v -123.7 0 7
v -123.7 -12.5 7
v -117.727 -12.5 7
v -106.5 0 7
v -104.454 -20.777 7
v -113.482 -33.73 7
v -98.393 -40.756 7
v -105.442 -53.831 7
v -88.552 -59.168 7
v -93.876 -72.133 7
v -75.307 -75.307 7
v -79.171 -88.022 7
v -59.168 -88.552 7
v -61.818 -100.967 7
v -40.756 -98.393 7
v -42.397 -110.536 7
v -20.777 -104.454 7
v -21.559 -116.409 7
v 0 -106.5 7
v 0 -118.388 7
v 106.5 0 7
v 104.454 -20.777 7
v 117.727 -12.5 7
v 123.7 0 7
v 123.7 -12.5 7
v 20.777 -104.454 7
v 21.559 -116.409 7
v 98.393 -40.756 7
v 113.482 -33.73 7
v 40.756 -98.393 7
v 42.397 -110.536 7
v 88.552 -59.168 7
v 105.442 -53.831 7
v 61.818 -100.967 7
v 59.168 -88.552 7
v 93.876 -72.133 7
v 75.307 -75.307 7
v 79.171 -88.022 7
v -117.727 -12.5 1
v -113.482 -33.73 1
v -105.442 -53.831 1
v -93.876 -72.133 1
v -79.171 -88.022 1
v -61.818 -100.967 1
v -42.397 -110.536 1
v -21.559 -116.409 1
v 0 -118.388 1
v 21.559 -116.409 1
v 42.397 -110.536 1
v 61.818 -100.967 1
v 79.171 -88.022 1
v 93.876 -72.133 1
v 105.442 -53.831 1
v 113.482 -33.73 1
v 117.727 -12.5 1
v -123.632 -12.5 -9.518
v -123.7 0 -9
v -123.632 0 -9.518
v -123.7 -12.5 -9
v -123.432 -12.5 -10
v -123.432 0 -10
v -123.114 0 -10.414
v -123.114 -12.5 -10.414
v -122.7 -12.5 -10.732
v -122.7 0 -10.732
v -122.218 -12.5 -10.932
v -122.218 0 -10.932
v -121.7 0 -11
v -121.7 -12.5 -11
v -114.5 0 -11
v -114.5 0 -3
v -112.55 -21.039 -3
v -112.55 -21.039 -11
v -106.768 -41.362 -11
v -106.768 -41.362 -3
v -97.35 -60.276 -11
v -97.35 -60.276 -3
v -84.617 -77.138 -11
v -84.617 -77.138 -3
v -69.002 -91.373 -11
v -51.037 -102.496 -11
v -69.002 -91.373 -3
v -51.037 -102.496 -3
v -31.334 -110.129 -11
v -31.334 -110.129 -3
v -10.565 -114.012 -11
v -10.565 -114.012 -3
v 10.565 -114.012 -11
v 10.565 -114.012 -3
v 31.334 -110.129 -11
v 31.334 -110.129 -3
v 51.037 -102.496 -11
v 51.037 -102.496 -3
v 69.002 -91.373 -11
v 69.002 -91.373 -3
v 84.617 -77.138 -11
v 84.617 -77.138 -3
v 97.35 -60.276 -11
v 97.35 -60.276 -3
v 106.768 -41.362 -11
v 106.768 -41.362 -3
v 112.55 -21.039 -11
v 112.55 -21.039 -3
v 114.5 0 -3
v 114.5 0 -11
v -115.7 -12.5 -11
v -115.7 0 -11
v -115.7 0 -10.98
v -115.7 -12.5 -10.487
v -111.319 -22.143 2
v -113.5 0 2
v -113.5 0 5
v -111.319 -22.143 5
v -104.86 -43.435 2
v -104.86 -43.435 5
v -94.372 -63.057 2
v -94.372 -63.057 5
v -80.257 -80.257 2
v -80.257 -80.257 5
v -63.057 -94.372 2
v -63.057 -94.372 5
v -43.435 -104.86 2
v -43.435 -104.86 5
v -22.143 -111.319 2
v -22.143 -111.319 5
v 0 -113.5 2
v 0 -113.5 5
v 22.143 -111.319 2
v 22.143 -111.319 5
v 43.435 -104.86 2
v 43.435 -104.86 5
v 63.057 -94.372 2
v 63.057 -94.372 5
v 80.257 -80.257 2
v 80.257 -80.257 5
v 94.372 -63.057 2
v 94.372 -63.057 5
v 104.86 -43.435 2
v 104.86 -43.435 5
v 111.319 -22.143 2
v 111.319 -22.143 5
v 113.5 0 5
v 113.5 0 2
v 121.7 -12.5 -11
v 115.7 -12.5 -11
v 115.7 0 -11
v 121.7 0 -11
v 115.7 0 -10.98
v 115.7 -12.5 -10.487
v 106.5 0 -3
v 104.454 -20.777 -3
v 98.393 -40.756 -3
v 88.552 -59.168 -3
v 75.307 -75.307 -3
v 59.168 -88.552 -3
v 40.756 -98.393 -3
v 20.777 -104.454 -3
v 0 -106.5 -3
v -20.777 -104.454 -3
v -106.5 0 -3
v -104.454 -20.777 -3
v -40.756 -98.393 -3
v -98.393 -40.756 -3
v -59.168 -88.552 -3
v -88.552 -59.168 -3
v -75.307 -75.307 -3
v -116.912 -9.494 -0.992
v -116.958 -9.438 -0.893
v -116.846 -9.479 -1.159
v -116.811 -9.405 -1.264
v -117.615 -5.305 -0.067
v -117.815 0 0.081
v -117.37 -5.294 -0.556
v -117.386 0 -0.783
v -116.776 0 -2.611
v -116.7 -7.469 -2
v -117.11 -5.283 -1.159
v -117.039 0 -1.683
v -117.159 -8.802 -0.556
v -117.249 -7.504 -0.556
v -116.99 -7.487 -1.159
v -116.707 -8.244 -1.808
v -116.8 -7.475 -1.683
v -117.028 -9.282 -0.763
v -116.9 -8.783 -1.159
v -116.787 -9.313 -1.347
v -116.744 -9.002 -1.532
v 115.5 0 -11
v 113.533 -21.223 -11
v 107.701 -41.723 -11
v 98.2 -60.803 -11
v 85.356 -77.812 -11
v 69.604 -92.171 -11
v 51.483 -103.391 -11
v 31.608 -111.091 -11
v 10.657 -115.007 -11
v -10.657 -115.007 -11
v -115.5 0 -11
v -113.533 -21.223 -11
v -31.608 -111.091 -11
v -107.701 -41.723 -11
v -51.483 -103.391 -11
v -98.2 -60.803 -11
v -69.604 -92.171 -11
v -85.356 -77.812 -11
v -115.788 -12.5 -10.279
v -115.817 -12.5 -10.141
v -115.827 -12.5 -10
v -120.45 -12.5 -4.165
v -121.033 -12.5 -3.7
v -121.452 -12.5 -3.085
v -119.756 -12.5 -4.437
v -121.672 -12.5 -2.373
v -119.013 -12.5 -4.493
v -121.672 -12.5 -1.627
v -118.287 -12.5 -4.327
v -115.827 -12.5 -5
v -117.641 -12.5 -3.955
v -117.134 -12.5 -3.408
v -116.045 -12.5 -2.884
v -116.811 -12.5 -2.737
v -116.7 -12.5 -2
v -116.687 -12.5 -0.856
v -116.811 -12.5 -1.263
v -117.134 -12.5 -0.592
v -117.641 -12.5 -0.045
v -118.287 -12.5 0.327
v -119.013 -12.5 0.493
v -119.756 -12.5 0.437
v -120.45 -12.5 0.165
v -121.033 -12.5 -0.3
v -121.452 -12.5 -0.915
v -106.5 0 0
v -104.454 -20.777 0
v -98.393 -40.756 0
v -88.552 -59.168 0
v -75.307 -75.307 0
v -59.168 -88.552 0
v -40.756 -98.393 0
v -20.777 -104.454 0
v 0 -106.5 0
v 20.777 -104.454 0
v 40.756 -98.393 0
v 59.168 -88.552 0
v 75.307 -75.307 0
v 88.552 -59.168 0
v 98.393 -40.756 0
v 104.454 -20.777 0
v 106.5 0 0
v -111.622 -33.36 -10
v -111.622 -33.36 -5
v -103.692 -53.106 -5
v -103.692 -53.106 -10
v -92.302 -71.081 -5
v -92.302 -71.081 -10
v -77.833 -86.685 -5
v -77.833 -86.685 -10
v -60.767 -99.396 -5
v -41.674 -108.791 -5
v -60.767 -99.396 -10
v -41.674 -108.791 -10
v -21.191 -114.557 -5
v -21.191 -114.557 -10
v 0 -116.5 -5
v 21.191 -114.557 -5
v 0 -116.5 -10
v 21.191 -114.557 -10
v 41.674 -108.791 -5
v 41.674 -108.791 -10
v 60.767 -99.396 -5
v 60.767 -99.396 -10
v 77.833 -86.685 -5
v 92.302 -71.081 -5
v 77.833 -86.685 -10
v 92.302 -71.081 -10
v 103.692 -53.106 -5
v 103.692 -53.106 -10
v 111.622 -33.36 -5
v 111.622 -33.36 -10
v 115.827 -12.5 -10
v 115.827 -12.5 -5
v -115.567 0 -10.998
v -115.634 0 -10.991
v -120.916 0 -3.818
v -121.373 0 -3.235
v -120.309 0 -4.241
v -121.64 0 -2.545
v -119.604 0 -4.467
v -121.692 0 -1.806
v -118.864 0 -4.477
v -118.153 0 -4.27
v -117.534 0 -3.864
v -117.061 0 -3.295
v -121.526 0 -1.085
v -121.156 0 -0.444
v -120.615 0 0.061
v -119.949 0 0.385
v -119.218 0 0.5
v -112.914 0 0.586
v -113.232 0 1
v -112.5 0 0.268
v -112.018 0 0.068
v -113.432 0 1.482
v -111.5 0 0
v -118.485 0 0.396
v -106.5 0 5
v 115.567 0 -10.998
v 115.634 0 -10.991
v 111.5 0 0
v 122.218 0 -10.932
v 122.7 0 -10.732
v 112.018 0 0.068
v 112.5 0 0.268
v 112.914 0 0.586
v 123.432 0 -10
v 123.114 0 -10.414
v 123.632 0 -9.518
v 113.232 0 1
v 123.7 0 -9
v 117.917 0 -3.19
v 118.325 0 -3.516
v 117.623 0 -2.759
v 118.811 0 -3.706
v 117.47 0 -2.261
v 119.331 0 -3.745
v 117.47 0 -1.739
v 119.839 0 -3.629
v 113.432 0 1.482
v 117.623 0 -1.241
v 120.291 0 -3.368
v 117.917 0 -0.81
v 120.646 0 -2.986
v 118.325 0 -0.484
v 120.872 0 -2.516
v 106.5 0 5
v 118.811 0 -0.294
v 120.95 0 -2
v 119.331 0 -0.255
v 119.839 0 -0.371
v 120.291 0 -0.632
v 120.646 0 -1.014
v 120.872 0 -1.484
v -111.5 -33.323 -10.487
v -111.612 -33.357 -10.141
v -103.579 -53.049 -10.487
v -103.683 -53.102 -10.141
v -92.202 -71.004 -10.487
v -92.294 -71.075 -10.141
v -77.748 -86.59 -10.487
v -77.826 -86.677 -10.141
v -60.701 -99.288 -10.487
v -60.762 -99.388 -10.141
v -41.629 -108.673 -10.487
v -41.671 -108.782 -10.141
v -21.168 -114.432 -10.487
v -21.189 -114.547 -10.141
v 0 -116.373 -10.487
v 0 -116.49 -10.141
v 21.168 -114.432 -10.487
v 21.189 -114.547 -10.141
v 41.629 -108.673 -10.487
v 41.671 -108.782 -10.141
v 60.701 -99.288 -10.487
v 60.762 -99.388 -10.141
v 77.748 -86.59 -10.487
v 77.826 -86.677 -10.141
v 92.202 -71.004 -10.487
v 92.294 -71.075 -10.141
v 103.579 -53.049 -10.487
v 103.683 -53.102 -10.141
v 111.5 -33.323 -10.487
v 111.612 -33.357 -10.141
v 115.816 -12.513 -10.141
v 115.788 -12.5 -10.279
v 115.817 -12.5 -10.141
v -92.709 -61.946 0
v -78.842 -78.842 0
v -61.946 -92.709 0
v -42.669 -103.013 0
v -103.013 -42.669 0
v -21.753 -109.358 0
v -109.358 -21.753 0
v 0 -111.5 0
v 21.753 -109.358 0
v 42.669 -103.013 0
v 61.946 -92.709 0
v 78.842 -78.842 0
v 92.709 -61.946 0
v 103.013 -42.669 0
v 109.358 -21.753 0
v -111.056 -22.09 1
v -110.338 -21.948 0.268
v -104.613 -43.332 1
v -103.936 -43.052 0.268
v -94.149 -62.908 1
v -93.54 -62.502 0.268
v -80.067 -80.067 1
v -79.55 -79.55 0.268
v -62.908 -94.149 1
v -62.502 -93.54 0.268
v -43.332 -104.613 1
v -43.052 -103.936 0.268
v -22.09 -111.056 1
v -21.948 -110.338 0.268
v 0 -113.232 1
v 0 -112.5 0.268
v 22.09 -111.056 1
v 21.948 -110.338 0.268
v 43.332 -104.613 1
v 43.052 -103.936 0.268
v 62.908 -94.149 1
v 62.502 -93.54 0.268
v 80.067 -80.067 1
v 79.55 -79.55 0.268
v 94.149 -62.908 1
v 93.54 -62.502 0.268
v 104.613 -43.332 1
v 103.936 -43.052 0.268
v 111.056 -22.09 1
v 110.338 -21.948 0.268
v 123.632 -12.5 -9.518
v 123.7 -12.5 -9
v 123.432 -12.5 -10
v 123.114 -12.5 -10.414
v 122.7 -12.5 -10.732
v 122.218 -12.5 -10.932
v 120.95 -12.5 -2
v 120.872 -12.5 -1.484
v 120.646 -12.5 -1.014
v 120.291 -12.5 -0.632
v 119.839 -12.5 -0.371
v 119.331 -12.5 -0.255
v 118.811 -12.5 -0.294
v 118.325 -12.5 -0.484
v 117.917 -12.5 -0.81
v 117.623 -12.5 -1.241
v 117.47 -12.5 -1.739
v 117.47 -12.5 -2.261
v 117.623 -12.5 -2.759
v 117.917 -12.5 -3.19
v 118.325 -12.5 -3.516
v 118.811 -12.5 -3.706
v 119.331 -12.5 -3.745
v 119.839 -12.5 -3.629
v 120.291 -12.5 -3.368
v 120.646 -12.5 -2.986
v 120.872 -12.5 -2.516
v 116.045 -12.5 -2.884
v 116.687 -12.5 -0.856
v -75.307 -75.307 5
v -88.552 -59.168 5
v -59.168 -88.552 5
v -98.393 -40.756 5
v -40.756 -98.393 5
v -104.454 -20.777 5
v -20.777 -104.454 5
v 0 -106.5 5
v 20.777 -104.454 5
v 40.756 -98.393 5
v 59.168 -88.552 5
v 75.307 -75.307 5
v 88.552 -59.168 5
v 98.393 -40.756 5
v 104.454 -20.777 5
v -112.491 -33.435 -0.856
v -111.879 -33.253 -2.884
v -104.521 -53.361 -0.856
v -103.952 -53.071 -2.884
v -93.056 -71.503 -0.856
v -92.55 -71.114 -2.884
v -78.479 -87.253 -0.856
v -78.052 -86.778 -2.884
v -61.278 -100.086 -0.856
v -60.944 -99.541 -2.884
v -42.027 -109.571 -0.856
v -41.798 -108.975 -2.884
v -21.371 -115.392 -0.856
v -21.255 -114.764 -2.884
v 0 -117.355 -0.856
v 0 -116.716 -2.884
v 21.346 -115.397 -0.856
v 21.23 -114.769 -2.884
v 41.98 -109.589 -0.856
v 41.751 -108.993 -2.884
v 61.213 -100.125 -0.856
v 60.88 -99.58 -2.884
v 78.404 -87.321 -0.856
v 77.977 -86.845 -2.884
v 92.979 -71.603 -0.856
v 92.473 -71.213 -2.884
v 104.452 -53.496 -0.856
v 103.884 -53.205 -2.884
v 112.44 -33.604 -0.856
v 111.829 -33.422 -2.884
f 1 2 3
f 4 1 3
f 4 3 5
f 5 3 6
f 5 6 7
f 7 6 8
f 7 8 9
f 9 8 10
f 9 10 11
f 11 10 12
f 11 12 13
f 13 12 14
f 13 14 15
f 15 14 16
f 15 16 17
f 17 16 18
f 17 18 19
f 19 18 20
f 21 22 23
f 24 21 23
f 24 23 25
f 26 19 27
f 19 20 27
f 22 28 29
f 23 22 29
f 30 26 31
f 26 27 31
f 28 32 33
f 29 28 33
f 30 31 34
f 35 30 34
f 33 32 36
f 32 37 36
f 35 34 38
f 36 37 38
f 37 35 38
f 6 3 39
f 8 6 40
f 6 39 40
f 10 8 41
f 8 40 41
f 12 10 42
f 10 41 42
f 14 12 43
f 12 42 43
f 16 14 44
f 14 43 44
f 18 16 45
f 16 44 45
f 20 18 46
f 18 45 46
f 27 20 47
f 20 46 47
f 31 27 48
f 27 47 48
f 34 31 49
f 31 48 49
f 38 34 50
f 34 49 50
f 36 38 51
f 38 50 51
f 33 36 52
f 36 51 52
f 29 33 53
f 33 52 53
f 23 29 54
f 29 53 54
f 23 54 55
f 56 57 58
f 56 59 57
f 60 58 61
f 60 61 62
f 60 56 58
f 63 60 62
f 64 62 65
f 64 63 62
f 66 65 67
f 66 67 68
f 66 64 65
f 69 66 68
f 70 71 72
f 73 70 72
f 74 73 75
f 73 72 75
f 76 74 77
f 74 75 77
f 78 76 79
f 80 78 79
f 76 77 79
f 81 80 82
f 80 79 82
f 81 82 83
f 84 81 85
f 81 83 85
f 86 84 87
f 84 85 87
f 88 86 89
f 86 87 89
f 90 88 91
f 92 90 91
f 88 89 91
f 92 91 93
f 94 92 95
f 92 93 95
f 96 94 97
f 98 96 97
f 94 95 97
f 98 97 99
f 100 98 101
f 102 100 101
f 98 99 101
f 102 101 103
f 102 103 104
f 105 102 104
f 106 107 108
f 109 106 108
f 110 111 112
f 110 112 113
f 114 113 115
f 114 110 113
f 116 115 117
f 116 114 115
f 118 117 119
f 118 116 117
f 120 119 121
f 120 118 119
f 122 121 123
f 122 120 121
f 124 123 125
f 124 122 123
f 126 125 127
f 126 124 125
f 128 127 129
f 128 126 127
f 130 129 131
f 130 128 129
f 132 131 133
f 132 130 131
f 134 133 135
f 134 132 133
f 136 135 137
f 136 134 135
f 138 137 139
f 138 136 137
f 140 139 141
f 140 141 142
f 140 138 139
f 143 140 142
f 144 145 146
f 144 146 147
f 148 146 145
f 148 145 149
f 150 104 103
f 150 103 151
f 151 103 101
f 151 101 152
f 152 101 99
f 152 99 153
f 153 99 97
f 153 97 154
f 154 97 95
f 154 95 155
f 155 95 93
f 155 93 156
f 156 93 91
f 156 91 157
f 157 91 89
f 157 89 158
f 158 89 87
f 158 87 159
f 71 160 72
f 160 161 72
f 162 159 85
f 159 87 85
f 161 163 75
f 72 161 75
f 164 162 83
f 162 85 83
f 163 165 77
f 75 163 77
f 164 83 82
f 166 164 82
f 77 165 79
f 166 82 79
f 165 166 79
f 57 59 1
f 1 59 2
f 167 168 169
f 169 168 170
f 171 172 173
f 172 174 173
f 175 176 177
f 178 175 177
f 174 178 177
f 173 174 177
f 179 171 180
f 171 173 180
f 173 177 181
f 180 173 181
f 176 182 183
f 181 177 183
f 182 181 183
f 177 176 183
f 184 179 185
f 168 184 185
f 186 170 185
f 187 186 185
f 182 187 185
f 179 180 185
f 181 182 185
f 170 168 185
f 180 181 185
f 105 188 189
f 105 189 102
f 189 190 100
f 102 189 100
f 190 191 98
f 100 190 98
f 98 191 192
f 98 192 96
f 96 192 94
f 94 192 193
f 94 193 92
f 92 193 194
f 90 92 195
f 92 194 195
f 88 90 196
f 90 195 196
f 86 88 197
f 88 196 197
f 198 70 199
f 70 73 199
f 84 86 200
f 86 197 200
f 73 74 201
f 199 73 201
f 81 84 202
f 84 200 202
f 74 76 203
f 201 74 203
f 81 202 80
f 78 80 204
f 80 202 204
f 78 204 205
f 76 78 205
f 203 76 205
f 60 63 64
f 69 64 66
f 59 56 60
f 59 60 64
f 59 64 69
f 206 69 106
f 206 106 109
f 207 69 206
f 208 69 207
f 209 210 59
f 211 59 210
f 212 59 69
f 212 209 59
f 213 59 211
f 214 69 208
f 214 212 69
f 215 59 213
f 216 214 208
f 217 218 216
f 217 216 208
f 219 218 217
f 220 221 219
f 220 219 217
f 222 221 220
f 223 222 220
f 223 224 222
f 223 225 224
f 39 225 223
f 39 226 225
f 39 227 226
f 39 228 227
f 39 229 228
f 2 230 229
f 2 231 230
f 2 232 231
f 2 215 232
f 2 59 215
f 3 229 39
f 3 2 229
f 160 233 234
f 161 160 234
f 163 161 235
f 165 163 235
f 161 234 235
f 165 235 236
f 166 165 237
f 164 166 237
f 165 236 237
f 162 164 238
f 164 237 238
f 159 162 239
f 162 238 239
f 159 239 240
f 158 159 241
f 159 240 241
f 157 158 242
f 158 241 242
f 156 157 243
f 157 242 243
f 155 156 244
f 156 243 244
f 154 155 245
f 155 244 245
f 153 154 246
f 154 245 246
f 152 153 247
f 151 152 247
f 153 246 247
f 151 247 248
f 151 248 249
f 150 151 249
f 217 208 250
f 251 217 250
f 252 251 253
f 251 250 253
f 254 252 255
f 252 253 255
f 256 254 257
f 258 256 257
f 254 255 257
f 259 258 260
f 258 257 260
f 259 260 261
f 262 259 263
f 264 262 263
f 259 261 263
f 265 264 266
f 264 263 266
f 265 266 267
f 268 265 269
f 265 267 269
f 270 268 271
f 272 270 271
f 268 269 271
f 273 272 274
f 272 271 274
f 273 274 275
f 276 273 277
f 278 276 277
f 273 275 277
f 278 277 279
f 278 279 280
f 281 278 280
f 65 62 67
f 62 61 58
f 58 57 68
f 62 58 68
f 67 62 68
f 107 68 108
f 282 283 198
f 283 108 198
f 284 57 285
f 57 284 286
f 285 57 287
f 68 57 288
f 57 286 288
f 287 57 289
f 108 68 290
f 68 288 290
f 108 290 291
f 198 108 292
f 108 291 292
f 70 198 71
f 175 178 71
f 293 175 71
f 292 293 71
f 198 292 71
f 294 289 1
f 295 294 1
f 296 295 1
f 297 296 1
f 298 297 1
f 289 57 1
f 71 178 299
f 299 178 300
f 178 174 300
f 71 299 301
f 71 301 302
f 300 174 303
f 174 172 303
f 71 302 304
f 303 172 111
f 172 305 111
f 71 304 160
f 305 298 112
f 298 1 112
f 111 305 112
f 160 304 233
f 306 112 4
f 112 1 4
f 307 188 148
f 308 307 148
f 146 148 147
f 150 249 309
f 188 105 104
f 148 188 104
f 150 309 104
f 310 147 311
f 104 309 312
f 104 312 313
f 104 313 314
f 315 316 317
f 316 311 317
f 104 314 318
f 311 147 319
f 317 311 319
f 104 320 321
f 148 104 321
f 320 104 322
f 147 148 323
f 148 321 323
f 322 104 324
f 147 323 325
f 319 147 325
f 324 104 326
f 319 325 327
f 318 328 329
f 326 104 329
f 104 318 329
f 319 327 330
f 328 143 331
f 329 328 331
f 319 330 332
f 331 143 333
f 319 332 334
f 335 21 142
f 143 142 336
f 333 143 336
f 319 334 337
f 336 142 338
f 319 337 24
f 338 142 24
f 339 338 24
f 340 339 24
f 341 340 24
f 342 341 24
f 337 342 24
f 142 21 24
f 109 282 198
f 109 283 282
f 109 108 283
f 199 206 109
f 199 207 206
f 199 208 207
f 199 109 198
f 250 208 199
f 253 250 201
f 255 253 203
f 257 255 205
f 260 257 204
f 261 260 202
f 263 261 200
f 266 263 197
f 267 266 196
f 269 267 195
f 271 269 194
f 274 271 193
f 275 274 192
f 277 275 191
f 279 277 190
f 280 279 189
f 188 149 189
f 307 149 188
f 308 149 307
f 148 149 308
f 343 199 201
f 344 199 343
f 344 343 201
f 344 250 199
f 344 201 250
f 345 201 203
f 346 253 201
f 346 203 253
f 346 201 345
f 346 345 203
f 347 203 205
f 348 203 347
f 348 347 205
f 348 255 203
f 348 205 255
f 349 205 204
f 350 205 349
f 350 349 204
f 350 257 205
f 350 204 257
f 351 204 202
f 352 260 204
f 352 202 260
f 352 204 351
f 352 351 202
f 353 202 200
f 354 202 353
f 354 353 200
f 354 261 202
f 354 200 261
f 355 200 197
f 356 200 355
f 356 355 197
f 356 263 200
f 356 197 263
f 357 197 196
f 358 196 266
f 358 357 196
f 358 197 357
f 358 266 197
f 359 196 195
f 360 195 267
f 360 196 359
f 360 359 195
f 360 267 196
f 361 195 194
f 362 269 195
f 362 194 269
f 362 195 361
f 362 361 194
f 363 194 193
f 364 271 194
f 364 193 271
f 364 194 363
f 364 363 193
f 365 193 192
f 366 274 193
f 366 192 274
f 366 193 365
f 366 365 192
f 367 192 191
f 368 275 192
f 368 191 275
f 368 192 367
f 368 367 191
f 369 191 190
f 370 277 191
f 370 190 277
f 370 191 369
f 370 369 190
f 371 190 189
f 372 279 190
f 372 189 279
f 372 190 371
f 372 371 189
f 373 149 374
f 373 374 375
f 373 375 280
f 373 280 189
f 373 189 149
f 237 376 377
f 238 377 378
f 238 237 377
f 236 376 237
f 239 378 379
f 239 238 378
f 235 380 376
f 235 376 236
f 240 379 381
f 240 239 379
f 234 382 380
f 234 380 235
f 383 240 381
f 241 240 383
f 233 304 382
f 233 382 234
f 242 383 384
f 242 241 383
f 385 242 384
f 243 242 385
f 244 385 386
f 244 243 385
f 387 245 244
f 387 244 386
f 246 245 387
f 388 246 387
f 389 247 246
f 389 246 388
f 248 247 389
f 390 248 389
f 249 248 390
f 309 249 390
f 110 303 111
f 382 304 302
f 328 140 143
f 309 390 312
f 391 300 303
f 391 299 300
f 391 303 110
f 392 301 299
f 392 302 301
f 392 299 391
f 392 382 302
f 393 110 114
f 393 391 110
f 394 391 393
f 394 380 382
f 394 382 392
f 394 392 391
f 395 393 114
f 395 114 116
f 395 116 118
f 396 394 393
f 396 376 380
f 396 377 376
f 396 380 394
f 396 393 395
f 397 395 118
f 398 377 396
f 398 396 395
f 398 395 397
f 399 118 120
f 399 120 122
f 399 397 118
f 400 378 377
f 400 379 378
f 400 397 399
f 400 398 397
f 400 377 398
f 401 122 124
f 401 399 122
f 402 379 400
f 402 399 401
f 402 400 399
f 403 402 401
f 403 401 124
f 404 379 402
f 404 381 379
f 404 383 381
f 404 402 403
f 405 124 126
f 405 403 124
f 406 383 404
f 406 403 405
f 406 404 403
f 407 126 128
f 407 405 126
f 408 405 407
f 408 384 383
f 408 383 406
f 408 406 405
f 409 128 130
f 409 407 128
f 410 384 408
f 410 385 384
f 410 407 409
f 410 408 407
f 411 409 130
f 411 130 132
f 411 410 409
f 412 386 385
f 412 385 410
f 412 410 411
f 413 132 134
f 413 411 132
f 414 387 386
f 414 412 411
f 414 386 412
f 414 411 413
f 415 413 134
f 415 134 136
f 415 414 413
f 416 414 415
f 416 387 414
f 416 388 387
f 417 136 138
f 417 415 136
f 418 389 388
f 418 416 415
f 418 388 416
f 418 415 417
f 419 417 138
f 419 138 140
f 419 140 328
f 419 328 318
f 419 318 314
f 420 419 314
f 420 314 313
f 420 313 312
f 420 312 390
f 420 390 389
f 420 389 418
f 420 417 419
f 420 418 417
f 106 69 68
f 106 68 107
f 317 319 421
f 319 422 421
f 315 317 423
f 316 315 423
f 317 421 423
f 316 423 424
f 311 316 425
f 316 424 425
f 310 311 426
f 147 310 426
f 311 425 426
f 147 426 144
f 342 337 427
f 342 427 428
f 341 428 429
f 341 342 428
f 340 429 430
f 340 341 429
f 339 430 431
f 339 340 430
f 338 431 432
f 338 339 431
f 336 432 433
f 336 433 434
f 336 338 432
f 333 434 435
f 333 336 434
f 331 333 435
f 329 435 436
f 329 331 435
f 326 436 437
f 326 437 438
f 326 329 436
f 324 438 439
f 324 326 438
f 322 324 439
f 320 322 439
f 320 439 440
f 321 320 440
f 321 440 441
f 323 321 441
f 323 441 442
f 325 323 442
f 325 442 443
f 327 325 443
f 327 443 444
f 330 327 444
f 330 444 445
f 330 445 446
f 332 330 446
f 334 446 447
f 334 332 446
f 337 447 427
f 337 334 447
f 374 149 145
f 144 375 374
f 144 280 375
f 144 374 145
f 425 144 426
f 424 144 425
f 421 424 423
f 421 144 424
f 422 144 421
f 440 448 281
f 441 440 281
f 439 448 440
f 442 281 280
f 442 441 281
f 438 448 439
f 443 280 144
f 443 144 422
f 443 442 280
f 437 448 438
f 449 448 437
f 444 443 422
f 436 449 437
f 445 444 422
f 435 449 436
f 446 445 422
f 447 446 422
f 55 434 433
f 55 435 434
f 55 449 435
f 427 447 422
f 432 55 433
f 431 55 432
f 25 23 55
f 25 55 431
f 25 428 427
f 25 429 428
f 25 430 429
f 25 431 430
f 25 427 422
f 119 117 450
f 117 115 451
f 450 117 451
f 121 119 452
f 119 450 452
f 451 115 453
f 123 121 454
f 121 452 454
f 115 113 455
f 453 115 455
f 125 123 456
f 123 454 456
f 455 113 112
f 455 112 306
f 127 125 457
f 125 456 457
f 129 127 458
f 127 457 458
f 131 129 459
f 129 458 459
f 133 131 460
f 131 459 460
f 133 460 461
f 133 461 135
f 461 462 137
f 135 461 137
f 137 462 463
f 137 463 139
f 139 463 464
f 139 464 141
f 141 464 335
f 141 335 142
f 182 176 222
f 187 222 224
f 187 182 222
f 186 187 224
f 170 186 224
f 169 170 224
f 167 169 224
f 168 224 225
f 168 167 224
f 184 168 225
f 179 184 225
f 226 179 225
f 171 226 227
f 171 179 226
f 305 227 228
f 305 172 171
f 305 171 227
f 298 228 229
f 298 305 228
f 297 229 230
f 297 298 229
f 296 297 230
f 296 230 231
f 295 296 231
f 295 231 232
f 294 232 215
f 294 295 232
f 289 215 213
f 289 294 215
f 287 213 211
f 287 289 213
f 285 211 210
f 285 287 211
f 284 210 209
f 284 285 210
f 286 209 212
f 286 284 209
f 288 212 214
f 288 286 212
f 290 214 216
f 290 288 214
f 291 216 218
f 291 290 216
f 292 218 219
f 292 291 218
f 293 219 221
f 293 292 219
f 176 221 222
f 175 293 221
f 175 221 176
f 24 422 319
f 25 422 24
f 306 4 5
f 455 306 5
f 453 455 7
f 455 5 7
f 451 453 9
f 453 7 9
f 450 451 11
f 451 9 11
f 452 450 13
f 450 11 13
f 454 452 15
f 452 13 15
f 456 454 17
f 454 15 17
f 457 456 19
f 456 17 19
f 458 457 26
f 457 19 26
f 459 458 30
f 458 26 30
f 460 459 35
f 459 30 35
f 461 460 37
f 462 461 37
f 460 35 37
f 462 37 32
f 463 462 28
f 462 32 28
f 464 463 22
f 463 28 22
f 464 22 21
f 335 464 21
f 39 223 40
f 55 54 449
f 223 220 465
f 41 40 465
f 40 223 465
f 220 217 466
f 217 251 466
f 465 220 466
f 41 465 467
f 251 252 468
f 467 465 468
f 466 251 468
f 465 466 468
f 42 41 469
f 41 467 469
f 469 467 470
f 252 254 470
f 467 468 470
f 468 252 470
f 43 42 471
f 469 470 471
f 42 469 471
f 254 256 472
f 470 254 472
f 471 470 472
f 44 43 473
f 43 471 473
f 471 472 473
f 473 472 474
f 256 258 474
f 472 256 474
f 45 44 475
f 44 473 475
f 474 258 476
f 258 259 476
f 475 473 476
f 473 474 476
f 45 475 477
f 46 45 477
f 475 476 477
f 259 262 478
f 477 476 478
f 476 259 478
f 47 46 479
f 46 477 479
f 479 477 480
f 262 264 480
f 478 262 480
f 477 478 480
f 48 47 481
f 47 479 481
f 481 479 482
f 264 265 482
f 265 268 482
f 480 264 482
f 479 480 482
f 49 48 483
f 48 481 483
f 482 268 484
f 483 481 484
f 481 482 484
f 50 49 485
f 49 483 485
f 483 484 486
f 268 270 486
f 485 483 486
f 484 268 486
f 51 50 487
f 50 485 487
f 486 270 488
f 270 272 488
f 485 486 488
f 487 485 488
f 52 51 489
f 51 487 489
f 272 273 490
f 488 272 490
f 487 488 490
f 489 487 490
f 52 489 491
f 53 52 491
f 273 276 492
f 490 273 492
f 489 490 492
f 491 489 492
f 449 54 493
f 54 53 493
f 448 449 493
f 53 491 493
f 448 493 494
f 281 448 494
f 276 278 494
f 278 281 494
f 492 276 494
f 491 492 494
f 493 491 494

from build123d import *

# Parameters (mm, degrees)
F2_R      = 113.5
F3_DEPTH  = 5
F4_R      = 1
F5_W      = 8
F5_H      = 18
F5_R      = 2.5
F7_DEPTH  = 12.5
F6_W      = 8
F6_H      = 18
F6_R      = 1.75
F8_DEPTH  = 12.5
F9_W      = 250
F9_H      = 100
F10_DEPTH = 150
F11_R     = 2
F12_R     = 2


with BuildPart() as f1:
    # F0 (on Front) → F1 (revolve)
    with BuildSketch(Plane.XZ):
        with BuildLine():
            Line((-114.5, -3), (-106.5, -3))
            Line((-106.5, -3), (-106.5, 0))
            Line((-106.5, 0), (-106.5, 7))
            Line((-106.5, 7), (-106.888494173, 7))
            Line((-106.888494173, 7), (-118.388494173, 7))
            Line((-118.388494173, 7.0000000475), (-118.388494173, 1.0000000475))
            ThreePointArc((-118.388494173, 1.0000000475), (-116.9832708565, -1.8549081567), (-116.5, -5))
            Line((-116.5, -5), (-116.5, -11))
            Line((-116.5, -11), (-114.5, -11))
            Line((-114.5, -11), (-114.5, -3))
        make_face()
    revolve(axis=Axis((0, 0, -0.2650997043), (0, 0, 1)))

    # F2 (on Top) → F3 (cut)
    with BuildSketch(Plane.XY):
        Circle(F2_R)
    extrude(amount=F3_DEPTH, mode=Mode.SUBTRACT)

    # F4
    f4_edges = [f1.edges().sort_by_distance(p)[0] for p in [
        (116.5, 0, -11),
    ]]
    fillet(f4_edges, radius=F4_R)

    # F5 (on Front) → F7 (join, symmetric)
    with BuildSketch(Plane.XZ):
        with Locations((-119.7, -2)):
            Rectangle(F5_W, F5_H)
        with Locations((-119.2, -2)):
            Circle(F5_R, mode=Mode.SUBTRACT)
    extrude(amount=F7_DEPTH, both=True)

    # F6 (on Front) → F8 (join, symmetric)
    with BuildSketch(Plane.XZ):
        with Locations((119.7, -2)):
            Rectangle(F6_W, F6_H)
        with Locations((119.2, -2)):
            Circle(F6_R, mode=Mode.SUBTRACT)
    extrude(amount=F8_DEPTH, both=True)

    # F9 (on Front) → F10 (cut)
    with BuildSketch(Plane.XZ):
        with Locations((0.1239156971, -32.2915658355)):
            Rectangle(F9_W, F9_H)
    extrude(amount=-F10_DEPTH, mode=Mode.SUBTRACT)

    # F11
    f11_edges = [f1.edges().sort_by_distance(p)[0] for p in [
        (0, -113.5, 0),
    ]]
    fillet(f11_edges, radius=F11_R)

    # F12
    f12_edges = [f1.edges().sort_by_distance(p)[0] for p in [
        (123.7, -6.25, -11),
        (-123.7, -6.25, -11),
    ]]
    fillet(f12_edges, radius=F12_R)


solid = f1.part
